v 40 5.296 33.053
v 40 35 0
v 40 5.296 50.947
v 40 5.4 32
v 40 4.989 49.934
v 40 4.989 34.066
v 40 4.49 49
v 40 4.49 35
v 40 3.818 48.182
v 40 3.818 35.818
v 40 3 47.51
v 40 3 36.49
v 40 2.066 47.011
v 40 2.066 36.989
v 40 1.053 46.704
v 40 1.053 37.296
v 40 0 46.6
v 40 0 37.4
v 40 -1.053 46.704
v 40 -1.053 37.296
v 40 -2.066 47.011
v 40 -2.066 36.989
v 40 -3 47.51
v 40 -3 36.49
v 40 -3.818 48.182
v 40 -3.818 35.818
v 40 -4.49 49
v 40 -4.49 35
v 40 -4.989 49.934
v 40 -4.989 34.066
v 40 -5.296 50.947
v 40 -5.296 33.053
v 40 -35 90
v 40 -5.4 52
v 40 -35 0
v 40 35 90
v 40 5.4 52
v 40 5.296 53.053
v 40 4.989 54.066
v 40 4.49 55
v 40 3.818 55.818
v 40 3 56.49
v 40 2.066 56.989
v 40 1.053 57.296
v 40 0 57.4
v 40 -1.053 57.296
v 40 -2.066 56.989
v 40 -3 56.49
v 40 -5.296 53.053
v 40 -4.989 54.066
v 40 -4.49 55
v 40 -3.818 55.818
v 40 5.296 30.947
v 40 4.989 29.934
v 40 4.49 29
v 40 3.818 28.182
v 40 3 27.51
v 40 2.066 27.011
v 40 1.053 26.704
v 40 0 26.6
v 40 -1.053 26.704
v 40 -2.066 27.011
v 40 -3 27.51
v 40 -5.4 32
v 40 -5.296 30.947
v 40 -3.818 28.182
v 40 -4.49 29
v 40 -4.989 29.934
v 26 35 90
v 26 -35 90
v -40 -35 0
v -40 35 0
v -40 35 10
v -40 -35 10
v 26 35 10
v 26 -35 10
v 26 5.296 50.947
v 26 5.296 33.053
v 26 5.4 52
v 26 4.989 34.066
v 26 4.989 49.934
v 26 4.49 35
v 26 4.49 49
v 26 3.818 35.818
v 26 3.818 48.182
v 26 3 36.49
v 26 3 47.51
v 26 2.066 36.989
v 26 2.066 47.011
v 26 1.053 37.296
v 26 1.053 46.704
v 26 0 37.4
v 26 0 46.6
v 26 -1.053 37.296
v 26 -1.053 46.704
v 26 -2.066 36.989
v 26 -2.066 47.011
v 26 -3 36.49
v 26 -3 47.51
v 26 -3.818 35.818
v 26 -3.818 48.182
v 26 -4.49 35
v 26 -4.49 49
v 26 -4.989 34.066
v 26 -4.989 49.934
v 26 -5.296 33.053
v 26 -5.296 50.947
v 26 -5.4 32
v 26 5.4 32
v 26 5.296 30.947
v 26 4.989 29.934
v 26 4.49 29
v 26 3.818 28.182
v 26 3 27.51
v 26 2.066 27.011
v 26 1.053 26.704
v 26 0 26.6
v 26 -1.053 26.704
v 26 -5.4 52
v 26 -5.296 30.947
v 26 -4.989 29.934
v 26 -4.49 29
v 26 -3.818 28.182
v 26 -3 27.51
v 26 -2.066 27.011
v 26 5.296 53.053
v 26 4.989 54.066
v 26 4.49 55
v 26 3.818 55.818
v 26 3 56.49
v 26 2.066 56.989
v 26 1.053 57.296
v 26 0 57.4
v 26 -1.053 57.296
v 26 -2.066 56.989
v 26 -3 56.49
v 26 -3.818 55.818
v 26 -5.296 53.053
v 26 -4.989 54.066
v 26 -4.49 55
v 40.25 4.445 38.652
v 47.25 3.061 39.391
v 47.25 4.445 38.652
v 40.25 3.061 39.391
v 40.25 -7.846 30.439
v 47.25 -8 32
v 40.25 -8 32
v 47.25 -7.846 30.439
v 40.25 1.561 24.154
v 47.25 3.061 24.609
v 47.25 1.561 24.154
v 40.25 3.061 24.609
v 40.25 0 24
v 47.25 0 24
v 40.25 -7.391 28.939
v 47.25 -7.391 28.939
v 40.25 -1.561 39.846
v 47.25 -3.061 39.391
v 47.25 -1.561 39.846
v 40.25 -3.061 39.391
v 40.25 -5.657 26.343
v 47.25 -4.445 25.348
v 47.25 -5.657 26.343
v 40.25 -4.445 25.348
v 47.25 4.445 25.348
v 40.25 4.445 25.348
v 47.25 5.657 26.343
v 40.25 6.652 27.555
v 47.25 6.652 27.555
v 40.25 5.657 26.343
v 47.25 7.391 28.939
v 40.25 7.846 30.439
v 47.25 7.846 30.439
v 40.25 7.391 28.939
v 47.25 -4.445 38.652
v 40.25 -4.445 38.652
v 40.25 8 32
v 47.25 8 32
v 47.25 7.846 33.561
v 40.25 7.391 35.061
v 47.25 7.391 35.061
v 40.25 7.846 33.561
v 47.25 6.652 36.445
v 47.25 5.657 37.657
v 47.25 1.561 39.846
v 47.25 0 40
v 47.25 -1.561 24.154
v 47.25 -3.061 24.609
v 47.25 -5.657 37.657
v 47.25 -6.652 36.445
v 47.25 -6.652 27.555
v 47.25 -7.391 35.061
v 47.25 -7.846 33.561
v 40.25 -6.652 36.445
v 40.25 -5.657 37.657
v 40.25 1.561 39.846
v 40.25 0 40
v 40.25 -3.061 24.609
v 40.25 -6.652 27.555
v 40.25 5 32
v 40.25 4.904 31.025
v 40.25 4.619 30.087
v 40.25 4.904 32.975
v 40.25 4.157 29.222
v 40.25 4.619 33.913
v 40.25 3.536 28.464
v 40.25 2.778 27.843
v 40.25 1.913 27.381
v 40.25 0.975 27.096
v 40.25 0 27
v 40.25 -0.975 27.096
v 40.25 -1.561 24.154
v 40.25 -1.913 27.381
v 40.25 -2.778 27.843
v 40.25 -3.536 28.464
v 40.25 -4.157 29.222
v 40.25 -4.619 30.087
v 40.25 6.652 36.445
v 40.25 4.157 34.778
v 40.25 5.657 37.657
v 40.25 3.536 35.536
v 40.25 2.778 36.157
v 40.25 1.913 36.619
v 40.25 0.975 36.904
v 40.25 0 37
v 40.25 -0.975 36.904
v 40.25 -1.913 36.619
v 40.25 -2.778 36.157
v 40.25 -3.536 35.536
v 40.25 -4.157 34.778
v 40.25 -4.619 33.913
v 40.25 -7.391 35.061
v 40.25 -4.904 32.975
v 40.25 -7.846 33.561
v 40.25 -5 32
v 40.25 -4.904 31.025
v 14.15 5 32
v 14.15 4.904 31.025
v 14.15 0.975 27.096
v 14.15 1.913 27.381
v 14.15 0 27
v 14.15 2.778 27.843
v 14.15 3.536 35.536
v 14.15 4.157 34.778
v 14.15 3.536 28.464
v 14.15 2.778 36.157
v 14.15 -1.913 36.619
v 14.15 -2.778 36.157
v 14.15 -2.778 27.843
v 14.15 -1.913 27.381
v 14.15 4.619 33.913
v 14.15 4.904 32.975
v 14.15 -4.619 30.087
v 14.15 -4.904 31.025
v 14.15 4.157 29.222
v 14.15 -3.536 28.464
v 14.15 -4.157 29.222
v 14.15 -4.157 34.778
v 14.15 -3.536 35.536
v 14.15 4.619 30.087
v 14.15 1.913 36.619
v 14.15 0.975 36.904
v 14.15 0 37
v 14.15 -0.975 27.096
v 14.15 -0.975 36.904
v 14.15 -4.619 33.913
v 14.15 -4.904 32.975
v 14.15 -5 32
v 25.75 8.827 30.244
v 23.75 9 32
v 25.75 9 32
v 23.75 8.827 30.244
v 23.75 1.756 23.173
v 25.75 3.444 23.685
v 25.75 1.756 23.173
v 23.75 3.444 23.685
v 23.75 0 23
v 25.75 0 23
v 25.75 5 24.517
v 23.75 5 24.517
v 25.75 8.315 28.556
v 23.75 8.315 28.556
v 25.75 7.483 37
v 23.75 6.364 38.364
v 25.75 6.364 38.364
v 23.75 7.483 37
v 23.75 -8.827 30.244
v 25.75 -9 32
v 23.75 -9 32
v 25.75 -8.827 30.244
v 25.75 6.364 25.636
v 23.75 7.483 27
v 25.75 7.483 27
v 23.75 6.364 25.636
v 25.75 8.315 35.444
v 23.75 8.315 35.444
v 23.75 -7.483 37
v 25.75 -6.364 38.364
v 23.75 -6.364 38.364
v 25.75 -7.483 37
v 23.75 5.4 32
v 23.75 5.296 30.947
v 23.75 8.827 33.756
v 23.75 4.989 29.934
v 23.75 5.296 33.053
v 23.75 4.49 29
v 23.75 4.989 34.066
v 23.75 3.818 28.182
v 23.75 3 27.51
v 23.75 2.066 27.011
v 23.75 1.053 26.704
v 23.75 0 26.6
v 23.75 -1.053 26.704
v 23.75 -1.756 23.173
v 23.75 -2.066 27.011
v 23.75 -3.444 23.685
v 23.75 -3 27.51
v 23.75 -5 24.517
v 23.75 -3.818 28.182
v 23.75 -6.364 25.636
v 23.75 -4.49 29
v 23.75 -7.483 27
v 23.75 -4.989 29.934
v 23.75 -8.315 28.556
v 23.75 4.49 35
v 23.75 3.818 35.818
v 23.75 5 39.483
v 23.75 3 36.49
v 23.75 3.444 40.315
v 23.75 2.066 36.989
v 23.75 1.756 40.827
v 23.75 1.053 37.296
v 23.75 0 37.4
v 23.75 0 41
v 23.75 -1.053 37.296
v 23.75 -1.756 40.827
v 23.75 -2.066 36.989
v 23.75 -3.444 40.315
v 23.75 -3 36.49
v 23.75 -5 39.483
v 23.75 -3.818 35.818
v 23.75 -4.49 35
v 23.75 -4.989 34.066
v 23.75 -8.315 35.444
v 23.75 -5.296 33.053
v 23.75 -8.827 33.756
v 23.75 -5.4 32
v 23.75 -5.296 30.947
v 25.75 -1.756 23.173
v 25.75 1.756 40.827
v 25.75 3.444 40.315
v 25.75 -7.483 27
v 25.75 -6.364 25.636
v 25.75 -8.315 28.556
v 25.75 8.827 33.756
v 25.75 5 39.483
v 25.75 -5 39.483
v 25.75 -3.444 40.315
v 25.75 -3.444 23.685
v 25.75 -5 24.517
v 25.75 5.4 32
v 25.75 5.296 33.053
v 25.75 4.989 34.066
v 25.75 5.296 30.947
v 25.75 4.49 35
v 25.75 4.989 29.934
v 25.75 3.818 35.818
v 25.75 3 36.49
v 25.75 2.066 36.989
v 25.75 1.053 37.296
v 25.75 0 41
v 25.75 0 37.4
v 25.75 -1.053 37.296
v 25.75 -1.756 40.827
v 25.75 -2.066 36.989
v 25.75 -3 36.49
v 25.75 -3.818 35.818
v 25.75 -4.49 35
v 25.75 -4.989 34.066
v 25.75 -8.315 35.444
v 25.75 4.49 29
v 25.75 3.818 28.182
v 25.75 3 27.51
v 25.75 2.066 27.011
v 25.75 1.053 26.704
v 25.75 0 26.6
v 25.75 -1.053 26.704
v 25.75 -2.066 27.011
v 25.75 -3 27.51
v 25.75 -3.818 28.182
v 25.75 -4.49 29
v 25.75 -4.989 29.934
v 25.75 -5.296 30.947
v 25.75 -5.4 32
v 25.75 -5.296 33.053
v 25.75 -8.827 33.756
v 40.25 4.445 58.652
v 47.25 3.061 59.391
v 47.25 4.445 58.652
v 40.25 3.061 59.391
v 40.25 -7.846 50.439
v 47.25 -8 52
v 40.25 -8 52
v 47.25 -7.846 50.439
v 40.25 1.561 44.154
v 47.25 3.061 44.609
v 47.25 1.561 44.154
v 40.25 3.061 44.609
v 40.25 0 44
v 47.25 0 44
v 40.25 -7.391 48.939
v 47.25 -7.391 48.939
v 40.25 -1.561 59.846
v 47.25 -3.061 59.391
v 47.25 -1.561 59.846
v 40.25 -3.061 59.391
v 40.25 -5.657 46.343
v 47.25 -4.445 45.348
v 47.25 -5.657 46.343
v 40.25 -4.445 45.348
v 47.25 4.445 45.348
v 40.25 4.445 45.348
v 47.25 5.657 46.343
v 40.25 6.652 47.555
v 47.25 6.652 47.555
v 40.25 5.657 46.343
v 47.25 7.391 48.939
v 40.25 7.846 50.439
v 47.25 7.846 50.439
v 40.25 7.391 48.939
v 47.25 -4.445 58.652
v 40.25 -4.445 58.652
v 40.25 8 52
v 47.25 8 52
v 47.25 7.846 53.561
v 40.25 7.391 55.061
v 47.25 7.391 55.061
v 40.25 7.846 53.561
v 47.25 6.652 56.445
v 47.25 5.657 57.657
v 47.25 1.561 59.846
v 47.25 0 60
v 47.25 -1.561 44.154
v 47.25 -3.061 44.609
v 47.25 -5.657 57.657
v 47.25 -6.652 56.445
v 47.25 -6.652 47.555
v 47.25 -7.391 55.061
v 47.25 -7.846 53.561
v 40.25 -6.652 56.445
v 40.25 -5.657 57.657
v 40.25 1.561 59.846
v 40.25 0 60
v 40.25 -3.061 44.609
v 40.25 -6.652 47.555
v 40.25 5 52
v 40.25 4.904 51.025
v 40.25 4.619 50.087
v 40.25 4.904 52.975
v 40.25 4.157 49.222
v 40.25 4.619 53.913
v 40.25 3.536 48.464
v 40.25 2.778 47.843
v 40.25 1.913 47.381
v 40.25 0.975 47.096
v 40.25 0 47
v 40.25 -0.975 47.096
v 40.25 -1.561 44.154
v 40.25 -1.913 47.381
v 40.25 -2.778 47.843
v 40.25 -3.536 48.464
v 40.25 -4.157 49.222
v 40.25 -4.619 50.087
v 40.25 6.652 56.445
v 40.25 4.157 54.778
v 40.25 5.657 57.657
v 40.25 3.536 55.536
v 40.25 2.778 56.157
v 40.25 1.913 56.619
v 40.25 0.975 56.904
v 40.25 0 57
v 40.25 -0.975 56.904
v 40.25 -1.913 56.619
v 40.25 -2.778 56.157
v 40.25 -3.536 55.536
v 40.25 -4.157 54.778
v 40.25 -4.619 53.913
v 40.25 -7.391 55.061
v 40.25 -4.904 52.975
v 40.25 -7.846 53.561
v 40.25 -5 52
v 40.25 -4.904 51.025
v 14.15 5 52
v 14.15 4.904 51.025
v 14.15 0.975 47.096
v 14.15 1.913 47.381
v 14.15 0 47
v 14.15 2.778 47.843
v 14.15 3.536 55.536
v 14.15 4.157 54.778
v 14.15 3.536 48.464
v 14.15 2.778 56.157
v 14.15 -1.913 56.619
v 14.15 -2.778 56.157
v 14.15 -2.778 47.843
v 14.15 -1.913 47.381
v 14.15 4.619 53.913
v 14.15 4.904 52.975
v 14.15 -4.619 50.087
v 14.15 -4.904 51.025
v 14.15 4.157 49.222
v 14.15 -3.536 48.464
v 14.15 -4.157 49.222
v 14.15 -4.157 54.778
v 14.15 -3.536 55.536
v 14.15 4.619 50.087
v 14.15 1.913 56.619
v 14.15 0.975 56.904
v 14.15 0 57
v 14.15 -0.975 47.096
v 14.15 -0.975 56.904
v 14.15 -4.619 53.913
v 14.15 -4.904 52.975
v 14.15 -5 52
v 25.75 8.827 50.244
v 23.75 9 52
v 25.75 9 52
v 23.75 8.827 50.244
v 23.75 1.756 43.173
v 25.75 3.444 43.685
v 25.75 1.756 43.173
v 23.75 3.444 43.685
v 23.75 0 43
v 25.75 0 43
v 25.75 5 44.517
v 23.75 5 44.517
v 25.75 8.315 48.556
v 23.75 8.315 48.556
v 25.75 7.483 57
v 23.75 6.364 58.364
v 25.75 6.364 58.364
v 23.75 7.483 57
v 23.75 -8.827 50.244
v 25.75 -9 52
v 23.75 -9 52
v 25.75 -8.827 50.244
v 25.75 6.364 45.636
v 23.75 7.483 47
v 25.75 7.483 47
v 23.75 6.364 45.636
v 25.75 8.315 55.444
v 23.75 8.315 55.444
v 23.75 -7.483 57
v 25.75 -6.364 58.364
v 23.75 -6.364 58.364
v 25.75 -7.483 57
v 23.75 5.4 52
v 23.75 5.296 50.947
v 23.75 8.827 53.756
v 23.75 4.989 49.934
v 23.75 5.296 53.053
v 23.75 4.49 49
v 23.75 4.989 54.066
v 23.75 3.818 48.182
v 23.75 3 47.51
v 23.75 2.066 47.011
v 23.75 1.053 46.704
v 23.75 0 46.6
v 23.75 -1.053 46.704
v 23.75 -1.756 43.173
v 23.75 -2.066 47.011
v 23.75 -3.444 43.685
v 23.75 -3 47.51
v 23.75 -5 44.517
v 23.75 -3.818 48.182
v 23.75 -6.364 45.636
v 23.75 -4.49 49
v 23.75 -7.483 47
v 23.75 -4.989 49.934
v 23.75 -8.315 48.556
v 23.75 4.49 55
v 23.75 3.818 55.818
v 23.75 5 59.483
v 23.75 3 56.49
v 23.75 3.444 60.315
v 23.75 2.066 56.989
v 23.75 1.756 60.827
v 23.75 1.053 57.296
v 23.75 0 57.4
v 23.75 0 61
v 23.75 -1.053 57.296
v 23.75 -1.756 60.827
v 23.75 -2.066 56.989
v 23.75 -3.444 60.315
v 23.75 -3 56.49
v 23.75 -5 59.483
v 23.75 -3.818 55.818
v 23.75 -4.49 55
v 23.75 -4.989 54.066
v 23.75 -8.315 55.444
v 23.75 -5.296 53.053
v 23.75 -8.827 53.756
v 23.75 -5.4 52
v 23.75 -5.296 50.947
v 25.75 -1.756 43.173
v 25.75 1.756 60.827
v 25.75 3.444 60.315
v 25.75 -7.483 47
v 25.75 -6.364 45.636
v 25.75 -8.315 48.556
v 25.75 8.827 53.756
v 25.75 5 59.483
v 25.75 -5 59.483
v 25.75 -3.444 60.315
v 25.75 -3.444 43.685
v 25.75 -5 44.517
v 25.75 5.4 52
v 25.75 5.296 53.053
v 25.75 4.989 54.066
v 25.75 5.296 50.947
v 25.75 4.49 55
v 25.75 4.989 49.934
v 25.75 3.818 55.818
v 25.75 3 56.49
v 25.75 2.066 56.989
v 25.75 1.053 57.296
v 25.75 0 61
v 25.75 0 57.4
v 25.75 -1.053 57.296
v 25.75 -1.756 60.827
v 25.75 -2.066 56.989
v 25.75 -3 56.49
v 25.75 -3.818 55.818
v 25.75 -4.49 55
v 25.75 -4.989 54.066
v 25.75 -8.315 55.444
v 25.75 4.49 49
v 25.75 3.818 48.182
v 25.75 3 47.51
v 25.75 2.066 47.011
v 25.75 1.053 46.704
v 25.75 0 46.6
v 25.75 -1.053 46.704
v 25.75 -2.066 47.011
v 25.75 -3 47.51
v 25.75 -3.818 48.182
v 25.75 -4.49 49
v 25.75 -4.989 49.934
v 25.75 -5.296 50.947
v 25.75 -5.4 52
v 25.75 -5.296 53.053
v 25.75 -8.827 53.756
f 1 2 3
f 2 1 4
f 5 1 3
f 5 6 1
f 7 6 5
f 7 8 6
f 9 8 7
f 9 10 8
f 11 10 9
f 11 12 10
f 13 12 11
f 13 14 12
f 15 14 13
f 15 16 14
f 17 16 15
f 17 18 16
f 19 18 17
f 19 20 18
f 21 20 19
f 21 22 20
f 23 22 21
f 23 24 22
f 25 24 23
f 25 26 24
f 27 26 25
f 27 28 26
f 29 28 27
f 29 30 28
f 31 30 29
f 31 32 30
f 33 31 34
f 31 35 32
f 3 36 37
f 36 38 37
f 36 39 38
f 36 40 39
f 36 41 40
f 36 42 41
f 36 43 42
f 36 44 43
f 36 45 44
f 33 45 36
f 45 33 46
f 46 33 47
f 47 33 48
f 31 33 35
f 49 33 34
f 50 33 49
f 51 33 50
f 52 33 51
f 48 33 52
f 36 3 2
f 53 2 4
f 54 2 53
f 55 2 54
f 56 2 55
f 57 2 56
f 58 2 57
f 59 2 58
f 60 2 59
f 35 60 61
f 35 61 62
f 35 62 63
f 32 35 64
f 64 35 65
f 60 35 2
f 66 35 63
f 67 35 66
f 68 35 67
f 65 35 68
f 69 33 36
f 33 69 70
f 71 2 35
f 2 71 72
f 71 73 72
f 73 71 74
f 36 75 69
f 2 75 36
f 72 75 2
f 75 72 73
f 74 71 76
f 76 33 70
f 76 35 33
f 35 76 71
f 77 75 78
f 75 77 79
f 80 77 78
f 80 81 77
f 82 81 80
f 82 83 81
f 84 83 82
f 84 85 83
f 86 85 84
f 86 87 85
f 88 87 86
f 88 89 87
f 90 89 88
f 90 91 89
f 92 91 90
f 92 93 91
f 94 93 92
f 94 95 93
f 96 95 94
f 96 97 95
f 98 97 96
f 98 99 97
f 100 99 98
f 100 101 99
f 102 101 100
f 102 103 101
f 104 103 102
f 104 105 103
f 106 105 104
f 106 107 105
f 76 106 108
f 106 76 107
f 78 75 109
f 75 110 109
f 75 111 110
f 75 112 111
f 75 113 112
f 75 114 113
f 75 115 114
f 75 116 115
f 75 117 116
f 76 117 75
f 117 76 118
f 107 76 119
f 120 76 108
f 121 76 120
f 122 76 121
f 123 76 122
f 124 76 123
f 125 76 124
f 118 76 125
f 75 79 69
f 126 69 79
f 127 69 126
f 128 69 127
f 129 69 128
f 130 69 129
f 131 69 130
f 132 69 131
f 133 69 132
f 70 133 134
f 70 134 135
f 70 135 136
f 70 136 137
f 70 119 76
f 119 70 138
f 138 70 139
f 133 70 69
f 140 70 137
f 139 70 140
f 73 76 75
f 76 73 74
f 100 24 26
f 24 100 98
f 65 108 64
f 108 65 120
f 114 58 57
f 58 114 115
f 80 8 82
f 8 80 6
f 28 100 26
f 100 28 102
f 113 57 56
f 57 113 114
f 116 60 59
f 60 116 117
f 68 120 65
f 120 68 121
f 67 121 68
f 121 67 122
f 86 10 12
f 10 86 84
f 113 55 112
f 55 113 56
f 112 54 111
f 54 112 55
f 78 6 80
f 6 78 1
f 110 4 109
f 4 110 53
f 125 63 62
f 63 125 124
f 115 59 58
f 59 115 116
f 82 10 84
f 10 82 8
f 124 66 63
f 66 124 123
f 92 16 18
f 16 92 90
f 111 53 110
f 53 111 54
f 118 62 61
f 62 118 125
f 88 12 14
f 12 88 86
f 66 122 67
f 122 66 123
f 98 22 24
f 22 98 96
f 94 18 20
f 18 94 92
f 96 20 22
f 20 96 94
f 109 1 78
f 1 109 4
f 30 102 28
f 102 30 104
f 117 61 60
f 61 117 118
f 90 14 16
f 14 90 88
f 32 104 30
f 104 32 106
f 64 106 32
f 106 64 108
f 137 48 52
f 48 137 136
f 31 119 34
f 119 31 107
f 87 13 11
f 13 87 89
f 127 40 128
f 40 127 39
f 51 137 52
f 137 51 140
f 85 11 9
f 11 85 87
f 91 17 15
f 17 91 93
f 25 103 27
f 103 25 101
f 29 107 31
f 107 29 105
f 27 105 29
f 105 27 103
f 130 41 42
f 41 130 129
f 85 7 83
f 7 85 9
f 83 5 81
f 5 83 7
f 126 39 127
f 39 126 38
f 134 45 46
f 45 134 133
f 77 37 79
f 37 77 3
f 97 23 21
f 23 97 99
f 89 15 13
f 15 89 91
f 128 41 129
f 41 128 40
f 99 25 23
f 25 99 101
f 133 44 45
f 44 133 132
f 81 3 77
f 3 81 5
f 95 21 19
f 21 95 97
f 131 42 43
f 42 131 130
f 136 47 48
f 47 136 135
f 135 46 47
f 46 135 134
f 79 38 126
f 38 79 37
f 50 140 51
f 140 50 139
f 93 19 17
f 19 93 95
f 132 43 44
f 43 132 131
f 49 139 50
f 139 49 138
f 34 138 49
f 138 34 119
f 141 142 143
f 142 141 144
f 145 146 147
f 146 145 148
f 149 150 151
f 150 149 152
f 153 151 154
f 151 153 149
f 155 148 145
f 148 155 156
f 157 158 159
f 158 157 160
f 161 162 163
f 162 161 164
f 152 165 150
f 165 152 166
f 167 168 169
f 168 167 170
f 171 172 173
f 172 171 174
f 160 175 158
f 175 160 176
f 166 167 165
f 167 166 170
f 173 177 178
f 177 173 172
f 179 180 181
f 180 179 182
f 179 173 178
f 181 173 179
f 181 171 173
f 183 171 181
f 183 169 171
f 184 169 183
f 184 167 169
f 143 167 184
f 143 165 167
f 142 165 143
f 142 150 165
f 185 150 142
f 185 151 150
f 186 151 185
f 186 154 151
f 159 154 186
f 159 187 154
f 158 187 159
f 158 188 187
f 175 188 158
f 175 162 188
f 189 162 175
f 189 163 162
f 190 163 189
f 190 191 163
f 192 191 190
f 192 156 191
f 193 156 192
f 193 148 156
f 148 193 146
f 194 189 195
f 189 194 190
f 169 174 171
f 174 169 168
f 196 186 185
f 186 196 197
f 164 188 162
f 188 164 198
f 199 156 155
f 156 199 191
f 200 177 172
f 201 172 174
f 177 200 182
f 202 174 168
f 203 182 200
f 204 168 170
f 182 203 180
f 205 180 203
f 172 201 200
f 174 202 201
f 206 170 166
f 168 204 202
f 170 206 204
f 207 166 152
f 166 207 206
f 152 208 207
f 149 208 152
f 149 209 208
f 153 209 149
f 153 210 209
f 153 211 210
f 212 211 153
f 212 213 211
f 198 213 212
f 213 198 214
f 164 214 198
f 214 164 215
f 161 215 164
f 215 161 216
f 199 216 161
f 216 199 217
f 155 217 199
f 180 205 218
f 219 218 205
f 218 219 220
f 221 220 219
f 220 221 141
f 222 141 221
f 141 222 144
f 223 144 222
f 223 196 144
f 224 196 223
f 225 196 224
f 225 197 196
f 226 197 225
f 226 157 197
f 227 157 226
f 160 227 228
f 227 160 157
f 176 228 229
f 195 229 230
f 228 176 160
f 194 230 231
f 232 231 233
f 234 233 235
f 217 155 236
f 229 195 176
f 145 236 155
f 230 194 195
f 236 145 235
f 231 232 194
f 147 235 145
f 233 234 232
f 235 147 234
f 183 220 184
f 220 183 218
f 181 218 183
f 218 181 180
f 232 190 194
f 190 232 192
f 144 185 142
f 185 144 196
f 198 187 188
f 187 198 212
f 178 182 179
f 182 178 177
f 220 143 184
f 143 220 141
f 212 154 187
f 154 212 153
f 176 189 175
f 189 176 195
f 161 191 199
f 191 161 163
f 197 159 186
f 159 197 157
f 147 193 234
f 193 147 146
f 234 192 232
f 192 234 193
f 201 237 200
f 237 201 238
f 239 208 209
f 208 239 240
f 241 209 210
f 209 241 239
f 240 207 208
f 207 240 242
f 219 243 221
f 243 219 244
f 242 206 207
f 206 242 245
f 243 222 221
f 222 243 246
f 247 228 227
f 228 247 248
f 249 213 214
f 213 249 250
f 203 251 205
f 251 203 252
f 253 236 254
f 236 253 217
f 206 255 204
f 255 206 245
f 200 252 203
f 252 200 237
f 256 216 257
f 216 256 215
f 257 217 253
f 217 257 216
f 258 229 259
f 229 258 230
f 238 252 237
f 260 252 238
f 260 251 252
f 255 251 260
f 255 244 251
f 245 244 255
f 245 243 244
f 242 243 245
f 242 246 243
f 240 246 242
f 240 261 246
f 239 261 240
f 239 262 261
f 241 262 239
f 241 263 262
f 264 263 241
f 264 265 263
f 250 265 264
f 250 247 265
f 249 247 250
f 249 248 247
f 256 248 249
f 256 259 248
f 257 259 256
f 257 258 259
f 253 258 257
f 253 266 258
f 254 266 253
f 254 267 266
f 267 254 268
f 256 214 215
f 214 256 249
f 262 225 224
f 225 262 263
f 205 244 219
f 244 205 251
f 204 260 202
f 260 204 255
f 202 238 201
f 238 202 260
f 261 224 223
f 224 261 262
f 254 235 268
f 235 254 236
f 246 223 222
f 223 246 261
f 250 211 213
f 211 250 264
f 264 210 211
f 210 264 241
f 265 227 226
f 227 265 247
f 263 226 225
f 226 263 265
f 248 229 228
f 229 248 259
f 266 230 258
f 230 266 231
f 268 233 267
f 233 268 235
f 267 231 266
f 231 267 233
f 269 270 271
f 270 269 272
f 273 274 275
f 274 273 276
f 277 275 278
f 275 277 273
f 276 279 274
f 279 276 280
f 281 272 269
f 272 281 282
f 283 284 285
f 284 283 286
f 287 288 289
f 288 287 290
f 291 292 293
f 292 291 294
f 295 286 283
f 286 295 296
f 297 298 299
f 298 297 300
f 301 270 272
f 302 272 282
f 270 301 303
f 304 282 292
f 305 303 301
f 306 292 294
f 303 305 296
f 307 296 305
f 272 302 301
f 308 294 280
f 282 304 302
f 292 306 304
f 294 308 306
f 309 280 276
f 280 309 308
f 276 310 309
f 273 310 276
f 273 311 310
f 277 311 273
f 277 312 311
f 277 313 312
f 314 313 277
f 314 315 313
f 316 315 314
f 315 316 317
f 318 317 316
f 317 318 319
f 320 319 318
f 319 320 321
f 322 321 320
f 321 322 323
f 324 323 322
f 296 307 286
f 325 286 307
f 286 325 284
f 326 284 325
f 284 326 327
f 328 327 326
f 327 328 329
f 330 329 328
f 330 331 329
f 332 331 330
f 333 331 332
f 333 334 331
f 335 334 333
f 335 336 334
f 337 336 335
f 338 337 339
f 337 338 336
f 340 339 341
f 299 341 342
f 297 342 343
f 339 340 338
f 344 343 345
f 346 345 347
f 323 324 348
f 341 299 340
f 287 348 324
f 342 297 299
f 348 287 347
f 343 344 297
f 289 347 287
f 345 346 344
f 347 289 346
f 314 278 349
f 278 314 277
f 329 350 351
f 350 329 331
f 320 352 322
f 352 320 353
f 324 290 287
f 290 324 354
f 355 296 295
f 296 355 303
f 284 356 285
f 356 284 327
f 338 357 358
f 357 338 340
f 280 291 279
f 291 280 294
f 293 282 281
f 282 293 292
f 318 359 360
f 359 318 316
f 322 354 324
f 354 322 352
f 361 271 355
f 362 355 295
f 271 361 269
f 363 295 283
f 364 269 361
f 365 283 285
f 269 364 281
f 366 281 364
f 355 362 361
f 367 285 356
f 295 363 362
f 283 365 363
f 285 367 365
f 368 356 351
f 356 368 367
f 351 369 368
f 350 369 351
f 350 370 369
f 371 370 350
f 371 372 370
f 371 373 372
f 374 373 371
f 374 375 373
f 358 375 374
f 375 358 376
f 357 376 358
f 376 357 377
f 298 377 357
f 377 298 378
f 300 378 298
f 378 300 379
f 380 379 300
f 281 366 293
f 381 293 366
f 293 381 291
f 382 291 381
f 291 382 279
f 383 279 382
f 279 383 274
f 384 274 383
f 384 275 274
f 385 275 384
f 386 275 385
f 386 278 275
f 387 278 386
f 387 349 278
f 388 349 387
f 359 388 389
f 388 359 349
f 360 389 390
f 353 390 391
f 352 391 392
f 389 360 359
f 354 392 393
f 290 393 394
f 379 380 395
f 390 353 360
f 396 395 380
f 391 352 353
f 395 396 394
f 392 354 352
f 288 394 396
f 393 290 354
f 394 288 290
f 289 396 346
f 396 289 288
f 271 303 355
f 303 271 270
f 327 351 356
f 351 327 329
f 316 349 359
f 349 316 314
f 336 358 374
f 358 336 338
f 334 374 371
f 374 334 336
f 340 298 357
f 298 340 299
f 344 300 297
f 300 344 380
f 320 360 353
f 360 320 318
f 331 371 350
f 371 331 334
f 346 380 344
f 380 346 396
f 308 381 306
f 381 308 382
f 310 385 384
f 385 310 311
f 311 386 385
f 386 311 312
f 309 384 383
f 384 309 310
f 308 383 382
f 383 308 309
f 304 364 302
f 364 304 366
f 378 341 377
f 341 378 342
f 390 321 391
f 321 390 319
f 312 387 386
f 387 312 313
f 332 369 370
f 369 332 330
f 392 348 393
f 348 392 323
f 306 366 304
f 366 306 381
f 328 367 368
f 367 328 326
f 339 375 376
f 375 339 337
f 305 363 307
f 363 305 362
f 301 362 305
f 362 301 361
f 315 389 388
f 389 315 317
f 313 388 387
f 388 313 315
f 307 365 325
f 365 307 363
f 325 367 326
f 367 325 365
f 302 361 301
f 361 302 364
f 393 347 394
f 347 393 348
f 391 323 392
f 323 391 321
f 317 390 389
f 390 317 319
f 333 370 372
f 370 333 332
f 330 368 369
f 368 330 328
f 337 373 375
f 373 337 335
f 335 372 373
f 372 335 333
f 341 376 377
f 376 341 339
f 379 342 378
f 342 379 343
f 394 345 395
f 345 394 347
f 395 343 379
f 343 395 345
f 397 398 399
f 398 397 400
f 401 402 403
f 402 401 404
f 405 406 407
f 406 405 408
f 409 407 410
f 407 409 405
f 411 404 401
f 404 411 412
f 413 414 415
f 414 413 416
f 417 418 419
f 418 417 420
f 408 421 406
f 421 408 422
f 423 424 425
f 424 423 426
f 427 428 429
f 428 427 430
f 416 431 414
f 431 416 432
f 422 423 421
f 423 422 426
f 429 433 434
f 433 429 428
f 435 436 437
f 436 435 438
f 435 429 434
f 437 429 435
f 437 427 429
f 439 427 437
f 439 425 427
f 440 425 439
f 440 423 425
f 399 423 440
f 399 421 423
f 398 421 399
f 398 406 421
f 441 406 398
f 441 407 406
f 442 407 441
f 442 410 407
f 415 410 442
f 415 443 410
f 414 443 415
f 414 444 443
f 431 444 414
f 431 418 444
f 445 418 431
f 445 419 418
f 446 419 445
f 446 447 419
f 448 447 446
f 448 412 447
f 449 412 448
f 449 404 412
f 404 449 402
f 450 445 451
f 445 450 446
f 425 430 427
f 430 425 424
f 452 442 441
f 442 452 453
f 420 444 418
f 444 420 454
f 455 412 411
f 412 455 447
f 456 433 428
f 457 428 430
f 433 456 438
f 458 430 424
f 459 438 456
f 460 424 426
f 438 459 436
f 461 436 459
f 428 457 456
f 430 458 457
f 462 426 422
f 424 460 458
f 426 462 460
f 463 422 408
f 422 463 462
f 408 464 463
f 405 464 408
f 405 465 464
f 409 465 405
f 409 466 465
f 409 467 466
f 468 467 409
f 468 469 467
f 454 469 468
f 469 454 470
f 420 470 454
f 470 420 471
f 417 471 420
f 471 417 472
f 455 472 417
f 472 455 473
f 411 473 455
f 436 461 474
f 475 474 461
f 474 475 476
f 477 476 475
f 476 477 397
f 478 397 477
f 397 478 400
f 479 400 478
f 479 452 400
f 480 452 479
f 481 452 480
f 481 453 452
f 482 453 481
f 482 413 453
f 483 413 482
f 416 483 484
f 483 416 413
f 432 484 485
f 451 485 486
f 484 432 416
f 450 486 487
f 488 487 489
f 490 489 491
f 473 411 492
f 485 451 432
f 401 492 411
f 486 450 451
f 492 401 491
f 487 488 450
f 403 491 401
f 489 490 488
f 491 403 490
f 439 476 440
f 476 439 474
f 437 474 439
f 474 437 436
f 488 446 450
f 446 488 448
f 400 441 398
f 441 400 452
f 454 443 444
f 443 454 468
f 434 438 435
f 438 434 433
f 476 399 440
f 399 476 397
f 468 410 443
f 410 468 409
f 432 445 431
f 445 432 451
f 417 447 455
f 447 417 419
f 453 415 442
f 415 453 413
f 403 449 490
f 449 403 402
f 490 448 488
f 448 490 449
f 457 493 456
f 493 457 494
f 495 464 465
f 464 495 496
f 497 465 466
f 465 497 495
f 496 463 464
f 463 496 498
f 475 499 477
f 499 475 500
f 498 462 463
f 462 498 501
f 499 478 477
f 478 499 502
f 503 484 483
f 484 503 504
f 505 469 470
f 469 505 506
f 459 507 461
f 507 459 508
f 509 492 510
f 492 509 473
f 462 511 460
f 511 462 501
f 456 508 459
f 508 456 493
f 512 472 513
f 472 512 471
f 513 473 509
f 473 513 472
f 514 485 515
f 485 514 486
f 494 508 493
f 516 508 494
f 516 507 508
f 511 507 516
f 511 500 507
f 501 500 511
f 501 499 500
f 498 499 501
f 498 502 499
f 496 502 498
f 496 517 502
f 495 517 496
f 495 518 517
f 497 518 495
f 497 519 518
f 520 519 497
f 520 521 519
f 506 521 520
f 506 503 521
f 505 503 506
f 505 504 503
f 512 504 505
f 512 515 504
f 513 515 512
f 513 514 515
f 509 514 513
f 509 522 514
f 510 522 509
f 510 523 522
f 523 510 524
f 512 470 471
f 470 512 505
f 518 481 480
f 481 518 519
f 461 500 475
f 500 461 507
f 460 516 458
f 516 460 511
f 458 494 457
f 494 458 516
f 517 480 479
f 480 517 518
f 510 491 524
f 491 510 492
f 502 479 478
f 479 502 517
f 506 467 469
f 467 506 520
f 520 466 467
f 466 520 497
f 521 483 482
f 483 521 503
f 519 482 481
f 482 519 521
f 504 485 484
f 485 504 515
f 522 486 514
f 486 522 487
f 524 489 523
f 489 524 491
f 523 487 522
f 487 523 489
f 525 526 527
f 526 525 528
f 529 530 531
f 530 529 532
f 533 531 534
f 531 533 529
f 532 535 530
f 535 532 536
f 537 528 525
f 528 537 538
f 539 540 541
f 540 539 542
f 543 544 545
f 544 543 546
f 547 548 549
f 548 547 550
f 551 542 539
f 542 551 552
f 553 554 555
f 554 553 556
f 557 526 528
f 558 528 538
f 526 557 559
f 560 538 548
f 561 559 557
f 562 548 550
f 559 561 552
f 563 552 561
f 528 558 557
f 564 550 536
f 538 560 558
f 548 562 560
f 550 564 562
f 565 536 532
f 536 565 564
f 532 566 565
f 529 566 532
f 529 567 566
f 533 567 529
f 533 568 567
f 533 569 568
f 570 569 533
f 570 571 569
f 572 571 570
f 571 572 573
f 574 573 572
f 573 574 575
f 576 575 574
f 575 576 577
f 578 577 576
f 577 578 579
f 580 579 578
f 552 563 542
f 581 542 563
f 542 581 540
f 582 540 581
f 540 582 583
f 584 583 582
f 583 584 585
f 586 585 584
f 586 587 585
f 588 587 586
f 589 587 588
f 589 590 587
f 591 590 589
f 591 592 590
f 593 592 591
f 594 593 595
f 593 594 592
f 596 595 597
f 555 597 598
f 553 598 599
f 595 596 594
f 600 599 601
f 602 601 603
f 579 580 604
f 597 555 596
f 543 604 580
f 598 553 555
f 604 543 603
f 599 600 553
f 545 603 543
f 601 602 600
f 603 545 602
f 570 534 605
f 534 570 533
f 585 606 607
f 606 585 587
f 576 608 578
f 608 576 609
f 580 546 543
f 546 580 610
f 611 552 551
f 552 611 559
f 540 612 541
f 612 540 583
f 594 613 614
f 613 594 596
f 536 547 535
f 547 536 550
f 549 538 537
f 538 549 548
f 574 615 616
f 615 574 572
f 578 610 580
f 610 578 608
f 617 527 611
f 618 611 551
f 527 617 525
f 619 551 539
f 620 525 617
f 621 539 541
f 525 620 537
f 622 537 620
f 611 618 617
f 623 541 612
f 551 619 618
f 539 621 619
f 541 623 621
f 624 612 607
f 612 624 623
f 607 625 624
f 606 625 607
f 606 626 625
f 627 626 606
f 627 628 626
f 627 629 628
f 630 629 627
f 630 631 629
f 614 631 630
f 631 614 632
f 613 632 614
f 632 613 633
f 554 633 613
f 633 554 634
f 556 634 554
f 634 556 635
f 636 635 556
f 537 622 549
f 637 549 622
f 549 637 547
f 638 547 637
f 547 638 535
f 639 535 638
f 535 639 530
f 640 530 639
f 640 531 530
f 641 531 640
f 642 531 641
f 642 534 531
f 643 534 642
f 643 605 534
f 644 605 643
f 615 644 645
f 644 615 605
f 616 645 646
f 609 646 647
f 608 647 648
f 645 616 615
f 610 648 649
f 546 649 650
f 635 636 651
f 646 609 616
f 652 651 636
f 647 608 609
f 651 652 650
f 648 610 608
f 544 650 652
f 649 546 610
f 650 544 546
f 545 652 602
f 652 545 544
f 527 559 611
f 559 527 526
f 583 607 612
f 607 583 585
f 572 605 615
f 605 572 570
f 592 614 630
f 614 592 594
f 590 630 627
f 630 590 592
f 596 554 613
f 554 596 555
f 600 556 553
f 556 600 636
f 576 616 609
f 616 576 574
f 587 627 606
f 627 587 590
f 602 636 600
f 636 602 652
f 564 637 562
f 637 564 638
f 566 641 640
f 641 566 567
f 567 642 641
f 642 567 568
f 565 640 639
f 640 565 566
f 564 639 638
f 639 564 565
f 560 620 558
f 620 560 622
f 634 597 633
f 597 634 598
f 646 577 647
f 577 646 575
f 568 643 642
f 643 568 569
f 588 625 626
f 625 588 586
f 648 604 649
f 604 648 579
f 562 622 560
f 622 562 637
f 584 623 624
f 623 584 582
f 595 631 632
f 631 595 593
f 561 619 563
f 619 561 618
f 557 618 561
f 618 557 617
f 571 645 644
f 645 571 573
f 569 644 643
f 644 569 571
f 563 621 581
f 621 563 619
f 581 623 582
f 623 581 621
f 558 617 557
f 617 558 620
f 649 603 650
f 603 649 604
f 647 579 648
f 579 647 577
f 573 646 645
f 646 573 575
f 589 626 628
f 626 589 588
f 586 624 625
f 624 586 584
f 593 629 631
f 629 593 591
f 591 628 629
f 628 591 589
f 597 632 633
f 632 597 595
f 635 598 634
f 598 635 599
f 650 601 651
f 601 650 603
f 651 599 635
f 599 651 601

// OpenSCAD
$fn = 32;

// ------------------------------------------------------------------------
// Bolted bracket: 80 x 70 mm bracket with 2 bolt joints
// Every part is its own module, assembly() places them once.
// ------------------------------------------------------------------------

// --- part 1 ---
module bracket() {
  difference() {
    translate([-40, -35, 0]) cube([80, 70, 90]);
    translate([-41, -36, 10]) cube([67, 72, 81]);
    translate([33, 0, 32]) rotate([0, 90, 0]) cylinder(h = 16, d = 10.8, center = true);
    translate([33, 0, 52]) rotate([0, 90, 0]) cylinder(h = 16, d = 10.8, center = true);
  }
}

// --- part 2 ---
module bolt1() {
  cylinder(h = 7, d = 16);
  translate([0, 0, -26.1]) cylinder(h = 26.1, d = 10);
}

// --- part 3 ---
module washer1() {
  difference() {
      translate([0, 0, 0]) cylinder(h = 2, d = 18);
      translate([0, 0, -1]) cylinder(h = 4, d = 10.8);
    }
}

// --- part 4 ---
module bolt2() {
  cylinder(h = 7, d = 16);
  translate([0, 0, -26.1]) cylinder(h = 26.1, d = 10);
}

// --- part 5 ---
module washer2() {
  difference() {
      translate([0, 0, 0]) cylinder(h = 2, d = 18);
      translate([0, 0, -1]) cylinder(h = 4, d = 10.8);
    }
}

// --- assembly ---
module assembly() {
  translate([0, 0, 0]) rotate([0, 0, 0]) bracket();
  translate([40.25, 0, 32]) rotate([0, 90, 0]) bolt1();
  translate([23.75, 0, 32]) rotate([0, 90, 0]) washer1();
  translate([40.25, 0, 52]) rotate([0, 90, 0]) bolt2();
  translate([23.75, 0, 52]) rotate([0, 90, 0]) washer2();
}

assembly();
